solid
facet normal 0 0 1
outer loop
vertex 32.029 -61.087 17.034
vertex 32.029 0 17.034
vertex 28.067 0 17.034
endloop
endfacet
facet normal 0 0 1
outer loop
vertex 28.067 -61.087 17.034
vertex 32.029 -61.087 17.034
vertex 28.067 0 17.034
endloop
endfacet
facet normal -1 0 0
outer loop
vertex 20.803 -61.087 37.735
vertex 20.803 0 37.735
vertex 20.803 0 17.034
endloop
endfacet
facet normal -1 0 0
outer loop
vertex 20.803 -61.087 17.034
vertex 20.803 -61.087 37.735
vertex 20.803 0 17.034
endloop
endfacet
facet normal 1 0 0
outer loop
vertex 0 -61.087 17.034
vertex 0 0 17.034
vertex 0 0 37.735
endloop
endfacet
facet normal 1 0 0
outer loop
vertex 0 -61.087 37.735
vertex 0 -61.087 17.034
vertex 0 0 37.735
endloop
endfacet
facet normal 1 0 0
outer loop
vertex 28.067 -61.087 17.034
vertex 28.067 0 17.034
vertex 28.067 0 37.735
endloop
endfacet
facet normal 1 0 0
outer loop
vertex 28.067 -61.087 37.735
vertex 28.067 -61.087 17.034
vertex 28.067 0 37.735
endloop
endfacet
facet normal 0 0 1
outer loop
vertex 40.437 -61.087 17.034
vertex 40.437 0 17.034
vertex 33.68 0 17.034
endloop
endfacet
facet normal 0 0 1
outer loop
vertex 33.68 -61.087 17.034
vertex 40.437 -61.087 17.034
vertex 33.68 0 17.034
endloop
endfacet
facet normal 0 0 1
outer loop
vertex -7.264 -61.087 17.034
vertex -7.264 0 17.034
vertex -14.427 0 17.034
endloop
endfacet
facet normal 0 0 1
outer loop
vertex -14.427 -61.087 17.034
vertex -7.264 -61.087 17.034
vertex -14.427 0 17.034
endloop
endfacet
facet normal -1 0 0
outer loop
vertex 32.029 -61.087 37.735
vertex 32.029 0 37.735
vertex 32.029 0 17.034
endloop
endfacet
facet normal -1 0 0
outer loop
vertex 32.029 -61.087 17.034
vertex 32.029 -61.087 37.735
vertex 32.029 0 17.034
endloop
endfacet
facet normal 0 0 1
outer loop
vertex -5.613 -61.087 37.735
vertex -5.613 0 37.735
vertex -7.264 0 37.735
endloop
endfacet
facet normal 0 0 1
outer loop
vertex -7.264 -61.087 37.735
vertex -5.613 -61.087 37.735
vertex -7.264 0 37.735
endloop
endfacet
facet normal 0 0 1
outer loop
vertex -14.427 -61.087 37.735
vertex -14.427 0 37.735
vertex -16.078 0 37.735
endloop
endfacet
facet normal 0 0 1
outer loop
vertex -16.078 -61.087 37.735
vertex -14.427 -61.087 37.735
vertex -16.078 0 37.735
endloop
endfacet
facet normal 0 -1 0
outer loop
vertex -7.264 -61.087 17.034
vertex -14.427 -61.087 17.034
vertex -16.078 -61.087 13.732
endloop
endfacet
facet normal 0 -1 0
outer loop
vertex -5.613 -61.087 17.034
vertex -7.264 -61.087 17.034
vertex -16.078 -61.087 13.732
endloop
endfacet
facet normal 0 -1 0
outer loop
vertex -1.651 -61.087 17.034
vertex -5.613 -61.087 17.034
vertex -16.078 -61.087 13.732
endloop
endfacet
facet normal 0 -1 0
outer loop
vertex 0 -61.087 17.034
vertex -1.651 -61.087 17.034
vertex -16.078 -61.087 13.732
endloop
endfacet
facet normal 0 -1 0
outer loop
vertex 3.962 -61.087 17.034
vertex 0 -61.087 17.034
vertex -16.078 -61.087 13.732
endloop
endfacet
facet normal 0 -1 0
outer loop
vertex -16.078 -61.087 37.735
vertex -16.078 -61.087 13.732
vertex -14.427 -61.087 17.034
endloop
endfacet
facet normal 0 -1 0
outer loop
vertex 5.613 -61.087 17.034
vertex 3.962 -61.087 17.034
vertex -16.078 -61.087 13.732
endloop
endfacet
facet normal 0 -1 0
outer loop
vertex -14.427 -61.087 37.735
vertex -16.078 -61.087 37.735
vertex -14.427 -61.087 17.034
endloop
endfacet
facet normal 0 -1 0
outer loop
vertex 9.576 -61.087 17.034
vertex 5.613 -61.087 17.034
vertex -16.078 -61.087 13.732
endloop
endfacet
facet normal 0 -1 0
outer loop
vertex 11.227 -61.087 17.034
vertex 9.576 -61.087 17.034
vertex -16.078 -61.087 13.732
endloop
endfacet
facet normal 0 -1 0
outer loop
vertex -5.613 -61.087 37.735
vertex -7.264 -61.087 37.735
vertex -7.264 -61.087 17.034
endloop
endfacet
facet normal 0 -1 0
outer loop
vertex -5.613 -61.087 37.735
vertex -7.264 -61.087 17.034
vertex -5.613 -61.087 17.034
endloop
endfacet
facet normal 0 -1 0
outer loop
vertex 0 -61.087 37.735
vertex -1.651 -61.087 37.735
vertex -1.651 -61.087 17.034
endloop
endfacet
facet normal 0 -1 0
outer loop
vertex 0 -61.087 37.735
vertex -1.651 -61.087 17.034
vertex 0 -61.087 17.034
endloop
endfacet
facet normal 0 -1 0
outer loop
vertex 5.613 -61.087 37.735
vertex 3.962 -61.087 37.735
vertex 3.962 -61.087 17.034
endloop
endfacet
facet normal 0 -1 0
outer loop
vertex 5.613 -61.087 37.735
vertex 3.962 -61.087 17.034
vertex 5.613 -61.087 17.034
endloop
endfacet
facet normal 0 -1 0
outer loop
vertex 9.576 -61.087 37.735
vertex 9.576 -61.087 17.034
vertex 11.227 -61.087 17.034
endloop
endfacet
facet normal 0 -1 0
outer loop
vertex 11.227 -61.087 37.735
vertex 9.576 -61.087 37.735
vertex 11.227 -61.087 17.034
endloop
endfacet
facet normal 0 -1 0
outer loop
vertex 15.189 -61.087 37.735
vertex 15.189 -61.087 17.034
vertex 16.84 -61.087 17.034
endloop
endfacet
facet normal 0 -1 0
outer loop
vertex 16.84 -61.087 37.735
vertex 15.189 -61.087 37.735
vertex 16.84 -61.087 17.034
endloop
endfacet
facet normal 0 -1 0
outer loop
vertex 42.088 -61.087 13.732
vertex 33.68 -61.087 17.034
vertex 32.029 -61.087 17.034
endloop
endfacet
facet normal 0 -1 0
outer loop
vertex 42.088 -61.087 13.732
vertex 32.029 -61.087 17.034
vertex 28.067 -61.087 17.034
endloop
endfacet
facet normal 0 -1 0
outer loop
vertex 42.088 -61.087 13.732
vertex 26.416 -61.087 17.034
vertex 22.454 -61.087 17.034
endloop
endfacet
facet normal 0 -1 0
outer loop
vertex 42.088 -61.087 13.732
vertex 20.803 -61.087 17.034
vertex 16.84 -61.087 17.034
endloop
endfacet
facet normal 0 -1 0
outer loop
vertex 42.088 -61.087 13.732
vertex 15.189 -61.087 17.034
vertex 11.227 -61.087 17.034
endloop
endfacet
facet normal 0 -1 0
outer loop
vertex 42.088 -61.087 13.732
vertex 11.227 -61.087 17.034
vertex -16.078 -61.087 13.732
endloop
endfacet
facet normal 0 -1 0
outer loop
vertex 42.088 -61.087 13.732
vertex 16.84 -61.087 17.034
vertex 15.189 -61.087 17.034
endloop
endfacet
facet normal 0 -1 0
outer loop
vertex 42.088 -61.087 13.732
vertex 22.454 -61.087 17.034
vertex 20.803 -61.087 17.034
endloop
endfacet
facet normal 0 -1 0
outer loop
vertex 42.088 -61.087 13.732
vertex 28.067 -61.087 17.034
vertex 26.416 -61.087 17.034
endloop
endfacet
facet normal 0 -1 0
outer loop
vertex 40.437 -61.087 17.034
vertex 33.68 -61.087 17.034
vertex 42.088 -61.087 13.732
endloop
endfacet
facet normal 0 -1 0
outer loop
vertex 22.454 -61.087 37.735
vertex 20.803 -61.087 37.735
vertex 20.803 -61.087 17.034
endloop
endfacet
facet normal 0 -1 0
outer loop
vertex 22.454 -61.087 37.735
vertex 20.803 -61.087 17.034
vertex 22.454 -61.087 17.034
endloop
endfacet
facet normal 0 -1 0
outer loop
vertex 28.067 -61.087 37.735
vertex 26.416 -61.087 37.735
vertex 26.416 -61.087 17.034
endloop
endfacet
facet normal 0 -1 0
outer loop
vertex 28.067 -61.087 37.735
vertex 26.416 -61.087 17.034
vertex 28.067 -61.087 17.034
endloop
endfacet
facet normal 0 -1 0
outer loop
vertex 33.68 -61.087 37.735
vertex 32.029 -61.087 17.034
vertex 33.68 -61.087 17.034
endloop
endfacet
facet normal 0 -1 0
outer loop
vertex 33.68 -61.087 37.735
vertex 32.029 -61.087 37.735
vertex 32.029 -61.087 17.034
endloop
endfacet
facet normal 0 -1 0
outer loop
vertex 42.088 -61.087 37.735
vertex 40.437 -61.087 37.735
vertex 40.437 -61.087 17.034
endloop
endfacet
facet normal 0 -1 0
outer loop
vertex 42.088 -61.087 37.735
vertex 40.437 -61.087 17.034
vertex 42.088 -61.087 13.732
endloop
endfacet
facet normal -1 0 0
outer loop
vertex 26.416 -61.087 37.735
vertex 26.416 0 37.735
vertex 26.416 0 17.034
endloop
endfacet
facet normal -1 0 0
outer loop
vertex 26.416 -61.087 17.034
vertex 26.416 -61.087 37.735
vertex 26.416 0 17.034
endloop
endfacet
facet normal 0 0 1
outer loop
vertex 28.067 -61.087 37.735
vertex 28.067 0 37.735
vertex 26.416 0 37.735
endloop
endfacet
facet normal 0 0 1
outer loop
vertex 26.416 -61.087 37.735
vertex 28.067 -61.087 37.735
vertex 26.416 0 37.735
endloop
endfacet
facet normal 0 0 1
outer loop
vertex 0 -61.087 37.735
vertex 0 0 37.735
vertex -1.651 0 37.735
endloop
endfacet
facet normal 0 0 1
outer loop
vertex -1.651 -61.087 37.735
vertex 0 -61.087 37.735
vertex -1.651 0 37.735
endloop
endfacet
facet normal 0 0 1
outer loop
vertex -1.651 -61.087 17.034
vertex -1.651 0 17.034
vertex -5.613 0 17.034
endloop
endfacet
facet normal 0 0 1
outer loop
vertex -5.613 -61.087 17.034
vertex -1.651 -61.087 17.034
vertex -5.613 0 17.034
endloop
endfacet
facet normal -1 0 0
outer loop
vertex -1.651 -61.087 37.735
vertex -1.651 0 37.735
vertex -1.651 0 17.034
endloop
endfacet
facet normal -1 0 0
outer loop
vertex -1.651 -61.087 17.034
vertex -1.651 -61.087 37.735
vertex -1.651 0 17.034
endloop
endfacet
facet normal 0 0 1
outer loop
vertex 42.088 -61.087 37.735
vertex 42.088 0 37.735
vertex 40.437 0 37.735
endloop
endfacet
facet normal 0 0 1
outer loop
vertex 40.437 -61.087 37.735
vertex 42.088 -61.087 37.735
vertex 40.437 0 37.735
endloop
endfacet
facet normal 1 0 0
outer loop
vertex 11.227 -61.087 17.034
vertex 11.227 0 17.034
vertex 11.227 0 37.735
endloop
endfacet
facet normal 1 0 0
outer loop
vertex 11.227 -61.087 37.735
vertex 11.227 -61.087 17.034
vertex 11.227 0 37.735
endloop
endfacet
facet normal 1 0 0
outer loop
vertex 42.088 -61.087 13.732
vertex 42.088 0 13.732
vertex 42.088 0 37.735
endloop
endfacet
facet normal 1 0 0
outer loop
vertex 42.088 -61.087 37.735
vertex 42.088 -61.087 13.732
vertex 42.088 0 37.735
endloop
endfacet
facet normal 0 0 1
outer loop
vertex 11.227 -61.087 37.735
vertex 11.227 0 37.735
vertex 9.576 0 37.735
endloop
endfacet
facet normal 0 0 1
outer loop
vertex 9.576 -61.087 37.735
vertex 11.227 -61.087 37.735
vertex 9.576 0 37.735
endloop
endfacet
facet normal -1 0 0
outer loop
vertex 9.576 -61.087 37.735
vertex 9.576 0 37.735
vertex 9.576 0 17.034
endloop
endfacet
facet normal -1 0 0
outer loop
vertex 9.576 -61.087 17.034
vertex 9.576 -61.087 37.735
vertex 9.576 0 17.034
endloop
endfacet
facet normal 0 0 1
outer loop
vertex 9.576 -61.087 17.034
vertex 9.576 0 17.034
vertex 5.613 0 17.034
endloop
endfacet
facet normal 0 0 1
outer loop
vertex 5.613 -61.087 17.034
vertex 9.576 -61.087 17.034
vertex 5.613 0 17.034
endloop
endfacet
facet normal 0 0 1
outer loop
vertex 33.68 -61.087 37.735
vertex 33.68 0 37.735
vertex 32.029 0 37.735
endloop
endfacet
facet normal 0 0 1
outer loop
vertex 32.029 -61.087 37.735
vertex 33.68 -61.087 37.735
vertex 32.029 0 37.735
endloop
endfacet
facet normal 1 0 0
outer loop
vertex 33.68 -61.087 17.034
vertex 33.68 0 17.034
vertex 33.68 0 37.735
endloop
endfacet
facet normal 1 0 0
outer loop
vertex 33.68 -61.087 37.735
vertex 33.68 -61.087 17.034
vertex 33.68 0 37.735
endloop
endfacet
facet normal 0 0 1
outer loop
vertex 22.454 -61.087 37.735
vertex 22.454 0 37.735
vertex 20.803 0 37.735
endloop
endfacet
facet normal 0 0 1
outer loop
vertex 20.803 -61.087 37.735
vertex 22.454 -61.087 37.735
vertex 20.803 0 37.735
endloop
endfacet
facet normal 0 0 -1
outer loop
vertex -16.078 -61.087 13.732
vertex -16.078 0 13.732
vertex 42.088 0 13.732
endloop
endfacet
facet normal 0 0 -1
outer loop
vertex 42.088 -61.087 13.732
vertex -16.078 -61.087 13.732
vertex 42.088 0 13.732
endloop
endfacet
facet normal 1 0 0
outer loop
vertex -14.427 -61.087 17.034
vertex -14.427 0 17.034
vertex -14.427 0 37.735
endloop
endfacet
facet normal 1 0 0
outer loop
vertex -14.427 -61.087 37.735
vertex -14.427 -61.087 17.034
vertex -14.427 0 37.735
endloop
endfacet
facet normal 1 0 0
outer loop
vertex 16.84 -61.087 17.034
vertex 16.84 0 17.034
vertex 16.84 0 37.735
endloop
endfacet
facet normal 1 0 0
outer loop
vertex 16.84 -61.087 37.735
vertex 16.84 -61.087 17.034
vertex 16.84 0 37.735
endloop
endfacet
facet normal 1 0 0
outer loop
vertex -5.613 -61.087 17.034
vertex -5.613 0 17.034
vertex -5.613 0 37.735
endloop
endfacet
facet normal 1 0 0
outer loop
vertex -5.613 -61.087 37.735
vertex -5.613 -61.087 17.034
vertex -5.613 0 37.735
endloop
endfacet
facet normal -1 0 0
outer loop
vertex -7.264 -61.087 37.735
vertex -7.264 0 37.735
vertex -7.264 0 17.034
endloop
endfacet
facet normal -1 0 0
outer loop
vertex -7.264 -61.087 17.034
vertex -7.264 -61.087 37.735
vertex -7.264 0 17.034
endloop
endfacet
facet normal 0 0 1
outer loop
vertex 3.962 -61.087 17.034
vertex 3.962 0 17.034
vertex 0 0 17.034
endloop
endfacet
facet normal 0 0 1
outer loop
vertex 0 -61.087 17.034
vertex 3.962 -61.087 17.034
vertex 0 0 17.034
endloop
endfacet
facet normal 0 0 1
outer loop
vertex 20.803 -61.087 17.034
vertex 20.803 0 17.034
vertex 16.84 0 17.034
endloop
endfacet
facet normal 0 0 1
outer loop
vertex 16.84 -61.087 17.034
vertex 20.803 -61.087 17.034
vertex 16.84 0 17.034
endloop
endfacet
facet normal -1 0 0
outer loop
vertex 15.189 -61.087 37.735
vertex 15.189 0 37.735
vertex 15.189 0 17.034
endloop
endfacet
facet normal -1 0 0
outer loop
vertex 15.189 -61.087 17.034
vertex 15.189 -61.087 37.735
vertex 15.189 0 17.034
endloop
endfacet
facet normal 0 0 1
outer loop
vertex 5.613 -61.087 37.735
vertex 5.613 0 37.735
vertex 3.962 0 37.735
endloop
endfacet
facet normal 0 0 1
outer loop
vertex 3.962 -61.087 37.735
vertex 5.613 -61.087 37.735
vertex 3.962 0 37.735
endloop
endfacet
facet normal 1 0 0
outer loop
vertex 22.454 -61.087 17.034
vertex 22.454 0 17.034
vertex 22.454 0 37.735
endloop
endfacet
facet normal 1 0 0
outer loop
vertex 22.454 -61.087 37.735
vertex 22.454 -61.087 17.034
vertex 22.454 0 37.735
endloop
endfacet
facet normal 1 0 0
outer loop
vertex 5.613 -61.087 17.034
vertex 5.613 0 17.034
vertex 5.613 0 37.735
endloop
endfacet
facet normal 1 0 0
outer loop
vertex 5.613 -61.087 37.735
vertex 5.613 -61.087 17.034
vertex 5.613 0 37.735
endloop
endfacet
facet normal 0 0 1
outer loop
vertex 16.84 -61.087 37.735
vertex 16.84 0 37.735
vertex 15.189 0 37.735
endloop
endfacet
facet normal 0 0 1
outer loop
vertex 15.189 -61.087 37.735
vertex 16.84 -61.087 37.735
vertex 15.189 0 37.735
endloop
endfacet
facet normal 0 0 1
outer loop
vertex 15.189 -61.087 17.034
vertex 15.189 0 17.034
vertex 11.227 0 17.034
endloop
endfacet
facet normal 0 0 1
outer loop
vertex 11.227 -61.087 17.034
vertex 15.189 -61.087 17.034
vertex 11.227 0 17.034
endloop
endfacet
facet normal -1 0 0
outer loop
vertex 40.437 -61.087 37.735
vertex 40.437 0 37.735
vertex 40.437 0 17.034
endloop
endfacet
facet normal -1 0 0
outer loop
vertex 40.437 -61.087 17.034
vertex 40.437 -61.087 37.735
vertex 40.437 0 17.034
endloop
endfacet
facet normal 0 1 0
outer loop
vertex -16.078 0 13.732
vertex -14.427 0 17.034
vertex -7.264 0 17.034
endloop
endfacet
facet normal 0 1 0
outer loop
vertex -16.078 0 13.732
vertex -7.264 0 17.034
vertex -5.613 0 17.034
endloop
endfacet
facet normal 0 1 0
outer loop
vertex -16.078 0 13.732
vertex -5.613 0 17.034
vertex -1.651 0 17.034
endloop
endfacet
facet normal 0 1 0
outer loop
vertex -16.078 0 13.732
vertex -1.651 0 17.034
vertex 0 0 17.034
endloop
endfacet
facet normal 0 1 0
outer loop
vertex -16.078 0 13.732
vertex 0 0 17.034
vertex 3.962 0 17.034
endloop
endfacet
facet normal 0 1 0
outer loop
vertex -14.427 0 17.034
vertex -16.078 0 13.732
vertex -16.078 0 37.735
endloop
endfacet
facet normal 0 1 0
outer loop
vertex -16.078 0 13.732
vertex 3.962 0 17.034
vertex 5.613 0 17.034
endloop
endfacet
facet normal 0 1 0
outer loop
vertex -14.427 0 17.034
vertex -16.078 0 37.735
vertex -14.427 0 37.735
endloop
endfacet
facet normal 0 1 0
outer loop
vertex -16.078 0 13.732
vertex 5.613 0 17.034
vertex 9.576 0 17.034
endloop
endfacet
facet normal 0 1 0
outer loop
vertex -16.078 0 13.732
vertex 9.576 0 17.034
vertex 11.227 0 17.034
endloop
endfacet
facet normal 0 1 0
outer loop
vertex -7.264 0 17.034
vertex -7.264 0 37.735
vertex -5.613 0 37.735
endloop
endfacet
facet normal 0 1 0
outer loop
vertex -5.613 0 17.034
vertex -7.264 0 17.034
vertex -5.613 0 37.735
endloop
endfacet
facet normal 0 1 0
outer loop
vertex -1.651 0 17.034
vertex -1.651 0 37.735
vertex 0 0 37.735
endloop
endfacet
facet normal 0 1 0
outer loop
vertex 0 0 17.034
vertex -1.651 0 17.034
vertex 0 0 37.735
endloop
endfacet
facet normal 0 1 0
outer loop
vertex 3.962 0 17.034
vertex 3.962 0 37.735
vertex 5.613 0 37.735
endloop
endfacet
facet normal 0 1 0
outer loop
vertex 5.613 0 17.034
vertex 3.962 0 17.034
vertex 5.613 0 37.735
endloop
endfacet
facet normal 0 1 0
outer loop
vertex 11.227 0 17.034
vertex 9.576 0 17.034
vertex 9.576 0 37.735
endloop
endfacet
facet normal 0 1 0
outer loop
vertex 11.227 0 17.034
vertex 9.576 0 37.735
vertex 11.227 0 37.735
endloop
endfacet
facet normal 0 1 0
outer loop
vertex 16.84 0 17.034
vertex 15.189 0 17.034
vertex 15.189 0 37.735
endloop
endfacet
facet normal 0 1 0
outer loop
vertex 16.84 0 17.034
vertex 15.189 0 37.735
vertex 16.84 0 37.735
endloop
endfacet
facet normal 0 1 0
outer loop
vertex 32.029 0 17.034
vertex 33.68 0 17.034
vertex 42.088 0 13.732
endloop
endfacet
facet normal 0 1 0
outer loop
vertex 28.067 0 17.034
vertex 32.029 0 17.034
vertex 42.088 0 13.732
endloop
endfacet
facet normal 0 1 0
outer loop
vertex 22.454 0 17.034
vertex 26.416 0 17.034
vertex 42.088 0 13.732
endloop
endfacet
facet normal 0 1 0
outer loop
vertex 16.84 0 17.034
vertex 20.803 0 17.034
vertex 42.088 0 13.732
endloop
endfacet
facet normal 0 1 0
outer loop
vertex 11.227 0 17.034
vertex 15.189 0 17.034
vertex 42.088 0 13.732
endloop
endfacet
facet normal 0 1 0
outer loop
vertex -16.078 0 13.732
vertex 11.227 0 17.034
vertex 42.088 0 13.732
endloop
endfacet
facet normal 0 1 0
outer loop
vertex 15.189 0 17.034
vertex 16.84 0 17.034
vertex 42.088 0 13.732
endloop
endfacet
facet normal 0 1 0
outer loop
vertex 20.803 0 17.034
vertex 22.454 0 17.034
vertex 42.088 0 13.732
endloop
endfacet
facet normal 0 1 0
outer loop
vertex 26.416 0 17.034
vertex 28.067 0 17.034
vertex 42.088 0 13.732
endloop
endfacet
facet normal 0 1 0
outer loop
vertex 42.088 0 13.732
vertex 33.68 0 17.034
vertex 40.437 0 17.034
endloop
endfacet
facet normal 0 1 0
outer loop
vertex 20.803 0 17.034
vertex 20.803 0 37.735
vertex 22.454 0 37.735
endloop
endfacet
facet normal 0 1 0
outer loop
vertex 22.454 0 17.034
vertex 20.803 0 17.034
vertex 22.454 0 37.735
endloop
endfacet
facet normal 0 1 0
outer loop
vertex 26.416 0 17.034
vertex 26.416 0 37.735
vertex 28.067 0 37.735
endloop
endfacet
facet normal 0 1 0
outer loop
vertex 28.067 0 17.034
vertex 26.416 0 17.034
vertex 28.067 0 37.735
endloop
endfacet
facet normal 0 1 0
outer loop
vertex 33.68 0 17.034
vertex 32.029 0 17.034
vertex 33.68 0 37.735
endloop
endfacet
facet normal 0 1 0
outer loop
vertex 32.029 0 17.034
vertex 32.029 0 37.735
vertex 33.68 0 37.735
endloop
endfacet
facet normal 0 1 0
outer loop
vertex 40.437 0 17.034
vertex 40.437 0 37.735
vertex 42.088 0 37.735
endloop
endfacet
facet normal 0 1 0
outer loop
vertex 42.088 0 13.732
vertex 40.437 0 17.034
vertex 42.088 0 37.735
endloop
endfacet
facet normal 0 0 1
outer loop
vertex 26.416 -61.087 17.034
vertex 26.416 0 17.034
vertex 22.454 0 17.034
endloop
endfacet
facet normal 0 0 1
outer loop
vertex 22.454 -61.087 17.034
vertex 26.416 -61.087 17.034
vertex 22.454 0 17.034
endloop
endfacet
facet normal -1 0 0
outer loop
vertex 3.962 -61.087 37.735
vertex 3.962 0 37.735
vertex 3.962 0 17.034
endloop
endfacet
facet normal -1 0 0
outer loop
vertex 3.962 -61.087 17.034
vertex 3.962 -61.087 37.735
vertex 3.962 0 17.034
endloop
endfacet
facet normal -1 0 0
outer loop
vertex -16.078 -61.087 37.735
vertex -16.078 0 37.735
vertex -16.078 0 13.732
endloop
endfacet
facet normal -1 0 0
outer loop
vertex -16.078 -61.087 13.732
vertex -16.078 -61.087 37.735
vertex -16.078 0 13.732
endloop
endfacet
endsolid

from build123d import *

# Parameters (mm, degrees)
F1_DEPTH = 61.087


with BuildPart() as f1:
    # F0 (on Front) → F1 (new body)
    with BuildSketch(Plane.XZ):
        Polygon((-14.4272, 37.735204), (-16.0782, 37.735204), (-16.0782, 13.732204), (42.0878, 13.732204), (42.0878, 37.735204), (40.4368, 37.735204), (40.4368, 17.034204), (33.6804, 17.034204), (33.6804, 37.735204), (32.0294, 37.735204), (32.0294, 17.034204), (28.067, 17.034204), (28.067, 37.735204), (26.416, 37.735204), (26.416, 17.034204), (22.4536, 17.034204), (22.4536, 37.735204), (20.8026, 37.735204), (20.8026, 17.034204), (16.8402, 17.034204), (16.8402, 37.735204), (15.1892, 37.735204), (15.1892, 17.034204), (11.2268, 17.034204), (11.2268, 37.735204), (9.5758, 37.735204), (9.5758, 17.034204), (5.6134, 17.034204), (5.6134, 37.735204), (3.9624, 37.735204), (3.9624, 17.034204), (0, 17.034204), (0, 37.735204), (-1.651, 37.735204), (-1.651, 17.034204), (-5.6134, 17.034204), (-5.6134, 37.735204), (-7.2644, 37.735204), (-7.2644, 17.034204), (-14.4272, 17.034204), align=None)
    extrude(amount=F1_DEPTH)


solid = f1.part
